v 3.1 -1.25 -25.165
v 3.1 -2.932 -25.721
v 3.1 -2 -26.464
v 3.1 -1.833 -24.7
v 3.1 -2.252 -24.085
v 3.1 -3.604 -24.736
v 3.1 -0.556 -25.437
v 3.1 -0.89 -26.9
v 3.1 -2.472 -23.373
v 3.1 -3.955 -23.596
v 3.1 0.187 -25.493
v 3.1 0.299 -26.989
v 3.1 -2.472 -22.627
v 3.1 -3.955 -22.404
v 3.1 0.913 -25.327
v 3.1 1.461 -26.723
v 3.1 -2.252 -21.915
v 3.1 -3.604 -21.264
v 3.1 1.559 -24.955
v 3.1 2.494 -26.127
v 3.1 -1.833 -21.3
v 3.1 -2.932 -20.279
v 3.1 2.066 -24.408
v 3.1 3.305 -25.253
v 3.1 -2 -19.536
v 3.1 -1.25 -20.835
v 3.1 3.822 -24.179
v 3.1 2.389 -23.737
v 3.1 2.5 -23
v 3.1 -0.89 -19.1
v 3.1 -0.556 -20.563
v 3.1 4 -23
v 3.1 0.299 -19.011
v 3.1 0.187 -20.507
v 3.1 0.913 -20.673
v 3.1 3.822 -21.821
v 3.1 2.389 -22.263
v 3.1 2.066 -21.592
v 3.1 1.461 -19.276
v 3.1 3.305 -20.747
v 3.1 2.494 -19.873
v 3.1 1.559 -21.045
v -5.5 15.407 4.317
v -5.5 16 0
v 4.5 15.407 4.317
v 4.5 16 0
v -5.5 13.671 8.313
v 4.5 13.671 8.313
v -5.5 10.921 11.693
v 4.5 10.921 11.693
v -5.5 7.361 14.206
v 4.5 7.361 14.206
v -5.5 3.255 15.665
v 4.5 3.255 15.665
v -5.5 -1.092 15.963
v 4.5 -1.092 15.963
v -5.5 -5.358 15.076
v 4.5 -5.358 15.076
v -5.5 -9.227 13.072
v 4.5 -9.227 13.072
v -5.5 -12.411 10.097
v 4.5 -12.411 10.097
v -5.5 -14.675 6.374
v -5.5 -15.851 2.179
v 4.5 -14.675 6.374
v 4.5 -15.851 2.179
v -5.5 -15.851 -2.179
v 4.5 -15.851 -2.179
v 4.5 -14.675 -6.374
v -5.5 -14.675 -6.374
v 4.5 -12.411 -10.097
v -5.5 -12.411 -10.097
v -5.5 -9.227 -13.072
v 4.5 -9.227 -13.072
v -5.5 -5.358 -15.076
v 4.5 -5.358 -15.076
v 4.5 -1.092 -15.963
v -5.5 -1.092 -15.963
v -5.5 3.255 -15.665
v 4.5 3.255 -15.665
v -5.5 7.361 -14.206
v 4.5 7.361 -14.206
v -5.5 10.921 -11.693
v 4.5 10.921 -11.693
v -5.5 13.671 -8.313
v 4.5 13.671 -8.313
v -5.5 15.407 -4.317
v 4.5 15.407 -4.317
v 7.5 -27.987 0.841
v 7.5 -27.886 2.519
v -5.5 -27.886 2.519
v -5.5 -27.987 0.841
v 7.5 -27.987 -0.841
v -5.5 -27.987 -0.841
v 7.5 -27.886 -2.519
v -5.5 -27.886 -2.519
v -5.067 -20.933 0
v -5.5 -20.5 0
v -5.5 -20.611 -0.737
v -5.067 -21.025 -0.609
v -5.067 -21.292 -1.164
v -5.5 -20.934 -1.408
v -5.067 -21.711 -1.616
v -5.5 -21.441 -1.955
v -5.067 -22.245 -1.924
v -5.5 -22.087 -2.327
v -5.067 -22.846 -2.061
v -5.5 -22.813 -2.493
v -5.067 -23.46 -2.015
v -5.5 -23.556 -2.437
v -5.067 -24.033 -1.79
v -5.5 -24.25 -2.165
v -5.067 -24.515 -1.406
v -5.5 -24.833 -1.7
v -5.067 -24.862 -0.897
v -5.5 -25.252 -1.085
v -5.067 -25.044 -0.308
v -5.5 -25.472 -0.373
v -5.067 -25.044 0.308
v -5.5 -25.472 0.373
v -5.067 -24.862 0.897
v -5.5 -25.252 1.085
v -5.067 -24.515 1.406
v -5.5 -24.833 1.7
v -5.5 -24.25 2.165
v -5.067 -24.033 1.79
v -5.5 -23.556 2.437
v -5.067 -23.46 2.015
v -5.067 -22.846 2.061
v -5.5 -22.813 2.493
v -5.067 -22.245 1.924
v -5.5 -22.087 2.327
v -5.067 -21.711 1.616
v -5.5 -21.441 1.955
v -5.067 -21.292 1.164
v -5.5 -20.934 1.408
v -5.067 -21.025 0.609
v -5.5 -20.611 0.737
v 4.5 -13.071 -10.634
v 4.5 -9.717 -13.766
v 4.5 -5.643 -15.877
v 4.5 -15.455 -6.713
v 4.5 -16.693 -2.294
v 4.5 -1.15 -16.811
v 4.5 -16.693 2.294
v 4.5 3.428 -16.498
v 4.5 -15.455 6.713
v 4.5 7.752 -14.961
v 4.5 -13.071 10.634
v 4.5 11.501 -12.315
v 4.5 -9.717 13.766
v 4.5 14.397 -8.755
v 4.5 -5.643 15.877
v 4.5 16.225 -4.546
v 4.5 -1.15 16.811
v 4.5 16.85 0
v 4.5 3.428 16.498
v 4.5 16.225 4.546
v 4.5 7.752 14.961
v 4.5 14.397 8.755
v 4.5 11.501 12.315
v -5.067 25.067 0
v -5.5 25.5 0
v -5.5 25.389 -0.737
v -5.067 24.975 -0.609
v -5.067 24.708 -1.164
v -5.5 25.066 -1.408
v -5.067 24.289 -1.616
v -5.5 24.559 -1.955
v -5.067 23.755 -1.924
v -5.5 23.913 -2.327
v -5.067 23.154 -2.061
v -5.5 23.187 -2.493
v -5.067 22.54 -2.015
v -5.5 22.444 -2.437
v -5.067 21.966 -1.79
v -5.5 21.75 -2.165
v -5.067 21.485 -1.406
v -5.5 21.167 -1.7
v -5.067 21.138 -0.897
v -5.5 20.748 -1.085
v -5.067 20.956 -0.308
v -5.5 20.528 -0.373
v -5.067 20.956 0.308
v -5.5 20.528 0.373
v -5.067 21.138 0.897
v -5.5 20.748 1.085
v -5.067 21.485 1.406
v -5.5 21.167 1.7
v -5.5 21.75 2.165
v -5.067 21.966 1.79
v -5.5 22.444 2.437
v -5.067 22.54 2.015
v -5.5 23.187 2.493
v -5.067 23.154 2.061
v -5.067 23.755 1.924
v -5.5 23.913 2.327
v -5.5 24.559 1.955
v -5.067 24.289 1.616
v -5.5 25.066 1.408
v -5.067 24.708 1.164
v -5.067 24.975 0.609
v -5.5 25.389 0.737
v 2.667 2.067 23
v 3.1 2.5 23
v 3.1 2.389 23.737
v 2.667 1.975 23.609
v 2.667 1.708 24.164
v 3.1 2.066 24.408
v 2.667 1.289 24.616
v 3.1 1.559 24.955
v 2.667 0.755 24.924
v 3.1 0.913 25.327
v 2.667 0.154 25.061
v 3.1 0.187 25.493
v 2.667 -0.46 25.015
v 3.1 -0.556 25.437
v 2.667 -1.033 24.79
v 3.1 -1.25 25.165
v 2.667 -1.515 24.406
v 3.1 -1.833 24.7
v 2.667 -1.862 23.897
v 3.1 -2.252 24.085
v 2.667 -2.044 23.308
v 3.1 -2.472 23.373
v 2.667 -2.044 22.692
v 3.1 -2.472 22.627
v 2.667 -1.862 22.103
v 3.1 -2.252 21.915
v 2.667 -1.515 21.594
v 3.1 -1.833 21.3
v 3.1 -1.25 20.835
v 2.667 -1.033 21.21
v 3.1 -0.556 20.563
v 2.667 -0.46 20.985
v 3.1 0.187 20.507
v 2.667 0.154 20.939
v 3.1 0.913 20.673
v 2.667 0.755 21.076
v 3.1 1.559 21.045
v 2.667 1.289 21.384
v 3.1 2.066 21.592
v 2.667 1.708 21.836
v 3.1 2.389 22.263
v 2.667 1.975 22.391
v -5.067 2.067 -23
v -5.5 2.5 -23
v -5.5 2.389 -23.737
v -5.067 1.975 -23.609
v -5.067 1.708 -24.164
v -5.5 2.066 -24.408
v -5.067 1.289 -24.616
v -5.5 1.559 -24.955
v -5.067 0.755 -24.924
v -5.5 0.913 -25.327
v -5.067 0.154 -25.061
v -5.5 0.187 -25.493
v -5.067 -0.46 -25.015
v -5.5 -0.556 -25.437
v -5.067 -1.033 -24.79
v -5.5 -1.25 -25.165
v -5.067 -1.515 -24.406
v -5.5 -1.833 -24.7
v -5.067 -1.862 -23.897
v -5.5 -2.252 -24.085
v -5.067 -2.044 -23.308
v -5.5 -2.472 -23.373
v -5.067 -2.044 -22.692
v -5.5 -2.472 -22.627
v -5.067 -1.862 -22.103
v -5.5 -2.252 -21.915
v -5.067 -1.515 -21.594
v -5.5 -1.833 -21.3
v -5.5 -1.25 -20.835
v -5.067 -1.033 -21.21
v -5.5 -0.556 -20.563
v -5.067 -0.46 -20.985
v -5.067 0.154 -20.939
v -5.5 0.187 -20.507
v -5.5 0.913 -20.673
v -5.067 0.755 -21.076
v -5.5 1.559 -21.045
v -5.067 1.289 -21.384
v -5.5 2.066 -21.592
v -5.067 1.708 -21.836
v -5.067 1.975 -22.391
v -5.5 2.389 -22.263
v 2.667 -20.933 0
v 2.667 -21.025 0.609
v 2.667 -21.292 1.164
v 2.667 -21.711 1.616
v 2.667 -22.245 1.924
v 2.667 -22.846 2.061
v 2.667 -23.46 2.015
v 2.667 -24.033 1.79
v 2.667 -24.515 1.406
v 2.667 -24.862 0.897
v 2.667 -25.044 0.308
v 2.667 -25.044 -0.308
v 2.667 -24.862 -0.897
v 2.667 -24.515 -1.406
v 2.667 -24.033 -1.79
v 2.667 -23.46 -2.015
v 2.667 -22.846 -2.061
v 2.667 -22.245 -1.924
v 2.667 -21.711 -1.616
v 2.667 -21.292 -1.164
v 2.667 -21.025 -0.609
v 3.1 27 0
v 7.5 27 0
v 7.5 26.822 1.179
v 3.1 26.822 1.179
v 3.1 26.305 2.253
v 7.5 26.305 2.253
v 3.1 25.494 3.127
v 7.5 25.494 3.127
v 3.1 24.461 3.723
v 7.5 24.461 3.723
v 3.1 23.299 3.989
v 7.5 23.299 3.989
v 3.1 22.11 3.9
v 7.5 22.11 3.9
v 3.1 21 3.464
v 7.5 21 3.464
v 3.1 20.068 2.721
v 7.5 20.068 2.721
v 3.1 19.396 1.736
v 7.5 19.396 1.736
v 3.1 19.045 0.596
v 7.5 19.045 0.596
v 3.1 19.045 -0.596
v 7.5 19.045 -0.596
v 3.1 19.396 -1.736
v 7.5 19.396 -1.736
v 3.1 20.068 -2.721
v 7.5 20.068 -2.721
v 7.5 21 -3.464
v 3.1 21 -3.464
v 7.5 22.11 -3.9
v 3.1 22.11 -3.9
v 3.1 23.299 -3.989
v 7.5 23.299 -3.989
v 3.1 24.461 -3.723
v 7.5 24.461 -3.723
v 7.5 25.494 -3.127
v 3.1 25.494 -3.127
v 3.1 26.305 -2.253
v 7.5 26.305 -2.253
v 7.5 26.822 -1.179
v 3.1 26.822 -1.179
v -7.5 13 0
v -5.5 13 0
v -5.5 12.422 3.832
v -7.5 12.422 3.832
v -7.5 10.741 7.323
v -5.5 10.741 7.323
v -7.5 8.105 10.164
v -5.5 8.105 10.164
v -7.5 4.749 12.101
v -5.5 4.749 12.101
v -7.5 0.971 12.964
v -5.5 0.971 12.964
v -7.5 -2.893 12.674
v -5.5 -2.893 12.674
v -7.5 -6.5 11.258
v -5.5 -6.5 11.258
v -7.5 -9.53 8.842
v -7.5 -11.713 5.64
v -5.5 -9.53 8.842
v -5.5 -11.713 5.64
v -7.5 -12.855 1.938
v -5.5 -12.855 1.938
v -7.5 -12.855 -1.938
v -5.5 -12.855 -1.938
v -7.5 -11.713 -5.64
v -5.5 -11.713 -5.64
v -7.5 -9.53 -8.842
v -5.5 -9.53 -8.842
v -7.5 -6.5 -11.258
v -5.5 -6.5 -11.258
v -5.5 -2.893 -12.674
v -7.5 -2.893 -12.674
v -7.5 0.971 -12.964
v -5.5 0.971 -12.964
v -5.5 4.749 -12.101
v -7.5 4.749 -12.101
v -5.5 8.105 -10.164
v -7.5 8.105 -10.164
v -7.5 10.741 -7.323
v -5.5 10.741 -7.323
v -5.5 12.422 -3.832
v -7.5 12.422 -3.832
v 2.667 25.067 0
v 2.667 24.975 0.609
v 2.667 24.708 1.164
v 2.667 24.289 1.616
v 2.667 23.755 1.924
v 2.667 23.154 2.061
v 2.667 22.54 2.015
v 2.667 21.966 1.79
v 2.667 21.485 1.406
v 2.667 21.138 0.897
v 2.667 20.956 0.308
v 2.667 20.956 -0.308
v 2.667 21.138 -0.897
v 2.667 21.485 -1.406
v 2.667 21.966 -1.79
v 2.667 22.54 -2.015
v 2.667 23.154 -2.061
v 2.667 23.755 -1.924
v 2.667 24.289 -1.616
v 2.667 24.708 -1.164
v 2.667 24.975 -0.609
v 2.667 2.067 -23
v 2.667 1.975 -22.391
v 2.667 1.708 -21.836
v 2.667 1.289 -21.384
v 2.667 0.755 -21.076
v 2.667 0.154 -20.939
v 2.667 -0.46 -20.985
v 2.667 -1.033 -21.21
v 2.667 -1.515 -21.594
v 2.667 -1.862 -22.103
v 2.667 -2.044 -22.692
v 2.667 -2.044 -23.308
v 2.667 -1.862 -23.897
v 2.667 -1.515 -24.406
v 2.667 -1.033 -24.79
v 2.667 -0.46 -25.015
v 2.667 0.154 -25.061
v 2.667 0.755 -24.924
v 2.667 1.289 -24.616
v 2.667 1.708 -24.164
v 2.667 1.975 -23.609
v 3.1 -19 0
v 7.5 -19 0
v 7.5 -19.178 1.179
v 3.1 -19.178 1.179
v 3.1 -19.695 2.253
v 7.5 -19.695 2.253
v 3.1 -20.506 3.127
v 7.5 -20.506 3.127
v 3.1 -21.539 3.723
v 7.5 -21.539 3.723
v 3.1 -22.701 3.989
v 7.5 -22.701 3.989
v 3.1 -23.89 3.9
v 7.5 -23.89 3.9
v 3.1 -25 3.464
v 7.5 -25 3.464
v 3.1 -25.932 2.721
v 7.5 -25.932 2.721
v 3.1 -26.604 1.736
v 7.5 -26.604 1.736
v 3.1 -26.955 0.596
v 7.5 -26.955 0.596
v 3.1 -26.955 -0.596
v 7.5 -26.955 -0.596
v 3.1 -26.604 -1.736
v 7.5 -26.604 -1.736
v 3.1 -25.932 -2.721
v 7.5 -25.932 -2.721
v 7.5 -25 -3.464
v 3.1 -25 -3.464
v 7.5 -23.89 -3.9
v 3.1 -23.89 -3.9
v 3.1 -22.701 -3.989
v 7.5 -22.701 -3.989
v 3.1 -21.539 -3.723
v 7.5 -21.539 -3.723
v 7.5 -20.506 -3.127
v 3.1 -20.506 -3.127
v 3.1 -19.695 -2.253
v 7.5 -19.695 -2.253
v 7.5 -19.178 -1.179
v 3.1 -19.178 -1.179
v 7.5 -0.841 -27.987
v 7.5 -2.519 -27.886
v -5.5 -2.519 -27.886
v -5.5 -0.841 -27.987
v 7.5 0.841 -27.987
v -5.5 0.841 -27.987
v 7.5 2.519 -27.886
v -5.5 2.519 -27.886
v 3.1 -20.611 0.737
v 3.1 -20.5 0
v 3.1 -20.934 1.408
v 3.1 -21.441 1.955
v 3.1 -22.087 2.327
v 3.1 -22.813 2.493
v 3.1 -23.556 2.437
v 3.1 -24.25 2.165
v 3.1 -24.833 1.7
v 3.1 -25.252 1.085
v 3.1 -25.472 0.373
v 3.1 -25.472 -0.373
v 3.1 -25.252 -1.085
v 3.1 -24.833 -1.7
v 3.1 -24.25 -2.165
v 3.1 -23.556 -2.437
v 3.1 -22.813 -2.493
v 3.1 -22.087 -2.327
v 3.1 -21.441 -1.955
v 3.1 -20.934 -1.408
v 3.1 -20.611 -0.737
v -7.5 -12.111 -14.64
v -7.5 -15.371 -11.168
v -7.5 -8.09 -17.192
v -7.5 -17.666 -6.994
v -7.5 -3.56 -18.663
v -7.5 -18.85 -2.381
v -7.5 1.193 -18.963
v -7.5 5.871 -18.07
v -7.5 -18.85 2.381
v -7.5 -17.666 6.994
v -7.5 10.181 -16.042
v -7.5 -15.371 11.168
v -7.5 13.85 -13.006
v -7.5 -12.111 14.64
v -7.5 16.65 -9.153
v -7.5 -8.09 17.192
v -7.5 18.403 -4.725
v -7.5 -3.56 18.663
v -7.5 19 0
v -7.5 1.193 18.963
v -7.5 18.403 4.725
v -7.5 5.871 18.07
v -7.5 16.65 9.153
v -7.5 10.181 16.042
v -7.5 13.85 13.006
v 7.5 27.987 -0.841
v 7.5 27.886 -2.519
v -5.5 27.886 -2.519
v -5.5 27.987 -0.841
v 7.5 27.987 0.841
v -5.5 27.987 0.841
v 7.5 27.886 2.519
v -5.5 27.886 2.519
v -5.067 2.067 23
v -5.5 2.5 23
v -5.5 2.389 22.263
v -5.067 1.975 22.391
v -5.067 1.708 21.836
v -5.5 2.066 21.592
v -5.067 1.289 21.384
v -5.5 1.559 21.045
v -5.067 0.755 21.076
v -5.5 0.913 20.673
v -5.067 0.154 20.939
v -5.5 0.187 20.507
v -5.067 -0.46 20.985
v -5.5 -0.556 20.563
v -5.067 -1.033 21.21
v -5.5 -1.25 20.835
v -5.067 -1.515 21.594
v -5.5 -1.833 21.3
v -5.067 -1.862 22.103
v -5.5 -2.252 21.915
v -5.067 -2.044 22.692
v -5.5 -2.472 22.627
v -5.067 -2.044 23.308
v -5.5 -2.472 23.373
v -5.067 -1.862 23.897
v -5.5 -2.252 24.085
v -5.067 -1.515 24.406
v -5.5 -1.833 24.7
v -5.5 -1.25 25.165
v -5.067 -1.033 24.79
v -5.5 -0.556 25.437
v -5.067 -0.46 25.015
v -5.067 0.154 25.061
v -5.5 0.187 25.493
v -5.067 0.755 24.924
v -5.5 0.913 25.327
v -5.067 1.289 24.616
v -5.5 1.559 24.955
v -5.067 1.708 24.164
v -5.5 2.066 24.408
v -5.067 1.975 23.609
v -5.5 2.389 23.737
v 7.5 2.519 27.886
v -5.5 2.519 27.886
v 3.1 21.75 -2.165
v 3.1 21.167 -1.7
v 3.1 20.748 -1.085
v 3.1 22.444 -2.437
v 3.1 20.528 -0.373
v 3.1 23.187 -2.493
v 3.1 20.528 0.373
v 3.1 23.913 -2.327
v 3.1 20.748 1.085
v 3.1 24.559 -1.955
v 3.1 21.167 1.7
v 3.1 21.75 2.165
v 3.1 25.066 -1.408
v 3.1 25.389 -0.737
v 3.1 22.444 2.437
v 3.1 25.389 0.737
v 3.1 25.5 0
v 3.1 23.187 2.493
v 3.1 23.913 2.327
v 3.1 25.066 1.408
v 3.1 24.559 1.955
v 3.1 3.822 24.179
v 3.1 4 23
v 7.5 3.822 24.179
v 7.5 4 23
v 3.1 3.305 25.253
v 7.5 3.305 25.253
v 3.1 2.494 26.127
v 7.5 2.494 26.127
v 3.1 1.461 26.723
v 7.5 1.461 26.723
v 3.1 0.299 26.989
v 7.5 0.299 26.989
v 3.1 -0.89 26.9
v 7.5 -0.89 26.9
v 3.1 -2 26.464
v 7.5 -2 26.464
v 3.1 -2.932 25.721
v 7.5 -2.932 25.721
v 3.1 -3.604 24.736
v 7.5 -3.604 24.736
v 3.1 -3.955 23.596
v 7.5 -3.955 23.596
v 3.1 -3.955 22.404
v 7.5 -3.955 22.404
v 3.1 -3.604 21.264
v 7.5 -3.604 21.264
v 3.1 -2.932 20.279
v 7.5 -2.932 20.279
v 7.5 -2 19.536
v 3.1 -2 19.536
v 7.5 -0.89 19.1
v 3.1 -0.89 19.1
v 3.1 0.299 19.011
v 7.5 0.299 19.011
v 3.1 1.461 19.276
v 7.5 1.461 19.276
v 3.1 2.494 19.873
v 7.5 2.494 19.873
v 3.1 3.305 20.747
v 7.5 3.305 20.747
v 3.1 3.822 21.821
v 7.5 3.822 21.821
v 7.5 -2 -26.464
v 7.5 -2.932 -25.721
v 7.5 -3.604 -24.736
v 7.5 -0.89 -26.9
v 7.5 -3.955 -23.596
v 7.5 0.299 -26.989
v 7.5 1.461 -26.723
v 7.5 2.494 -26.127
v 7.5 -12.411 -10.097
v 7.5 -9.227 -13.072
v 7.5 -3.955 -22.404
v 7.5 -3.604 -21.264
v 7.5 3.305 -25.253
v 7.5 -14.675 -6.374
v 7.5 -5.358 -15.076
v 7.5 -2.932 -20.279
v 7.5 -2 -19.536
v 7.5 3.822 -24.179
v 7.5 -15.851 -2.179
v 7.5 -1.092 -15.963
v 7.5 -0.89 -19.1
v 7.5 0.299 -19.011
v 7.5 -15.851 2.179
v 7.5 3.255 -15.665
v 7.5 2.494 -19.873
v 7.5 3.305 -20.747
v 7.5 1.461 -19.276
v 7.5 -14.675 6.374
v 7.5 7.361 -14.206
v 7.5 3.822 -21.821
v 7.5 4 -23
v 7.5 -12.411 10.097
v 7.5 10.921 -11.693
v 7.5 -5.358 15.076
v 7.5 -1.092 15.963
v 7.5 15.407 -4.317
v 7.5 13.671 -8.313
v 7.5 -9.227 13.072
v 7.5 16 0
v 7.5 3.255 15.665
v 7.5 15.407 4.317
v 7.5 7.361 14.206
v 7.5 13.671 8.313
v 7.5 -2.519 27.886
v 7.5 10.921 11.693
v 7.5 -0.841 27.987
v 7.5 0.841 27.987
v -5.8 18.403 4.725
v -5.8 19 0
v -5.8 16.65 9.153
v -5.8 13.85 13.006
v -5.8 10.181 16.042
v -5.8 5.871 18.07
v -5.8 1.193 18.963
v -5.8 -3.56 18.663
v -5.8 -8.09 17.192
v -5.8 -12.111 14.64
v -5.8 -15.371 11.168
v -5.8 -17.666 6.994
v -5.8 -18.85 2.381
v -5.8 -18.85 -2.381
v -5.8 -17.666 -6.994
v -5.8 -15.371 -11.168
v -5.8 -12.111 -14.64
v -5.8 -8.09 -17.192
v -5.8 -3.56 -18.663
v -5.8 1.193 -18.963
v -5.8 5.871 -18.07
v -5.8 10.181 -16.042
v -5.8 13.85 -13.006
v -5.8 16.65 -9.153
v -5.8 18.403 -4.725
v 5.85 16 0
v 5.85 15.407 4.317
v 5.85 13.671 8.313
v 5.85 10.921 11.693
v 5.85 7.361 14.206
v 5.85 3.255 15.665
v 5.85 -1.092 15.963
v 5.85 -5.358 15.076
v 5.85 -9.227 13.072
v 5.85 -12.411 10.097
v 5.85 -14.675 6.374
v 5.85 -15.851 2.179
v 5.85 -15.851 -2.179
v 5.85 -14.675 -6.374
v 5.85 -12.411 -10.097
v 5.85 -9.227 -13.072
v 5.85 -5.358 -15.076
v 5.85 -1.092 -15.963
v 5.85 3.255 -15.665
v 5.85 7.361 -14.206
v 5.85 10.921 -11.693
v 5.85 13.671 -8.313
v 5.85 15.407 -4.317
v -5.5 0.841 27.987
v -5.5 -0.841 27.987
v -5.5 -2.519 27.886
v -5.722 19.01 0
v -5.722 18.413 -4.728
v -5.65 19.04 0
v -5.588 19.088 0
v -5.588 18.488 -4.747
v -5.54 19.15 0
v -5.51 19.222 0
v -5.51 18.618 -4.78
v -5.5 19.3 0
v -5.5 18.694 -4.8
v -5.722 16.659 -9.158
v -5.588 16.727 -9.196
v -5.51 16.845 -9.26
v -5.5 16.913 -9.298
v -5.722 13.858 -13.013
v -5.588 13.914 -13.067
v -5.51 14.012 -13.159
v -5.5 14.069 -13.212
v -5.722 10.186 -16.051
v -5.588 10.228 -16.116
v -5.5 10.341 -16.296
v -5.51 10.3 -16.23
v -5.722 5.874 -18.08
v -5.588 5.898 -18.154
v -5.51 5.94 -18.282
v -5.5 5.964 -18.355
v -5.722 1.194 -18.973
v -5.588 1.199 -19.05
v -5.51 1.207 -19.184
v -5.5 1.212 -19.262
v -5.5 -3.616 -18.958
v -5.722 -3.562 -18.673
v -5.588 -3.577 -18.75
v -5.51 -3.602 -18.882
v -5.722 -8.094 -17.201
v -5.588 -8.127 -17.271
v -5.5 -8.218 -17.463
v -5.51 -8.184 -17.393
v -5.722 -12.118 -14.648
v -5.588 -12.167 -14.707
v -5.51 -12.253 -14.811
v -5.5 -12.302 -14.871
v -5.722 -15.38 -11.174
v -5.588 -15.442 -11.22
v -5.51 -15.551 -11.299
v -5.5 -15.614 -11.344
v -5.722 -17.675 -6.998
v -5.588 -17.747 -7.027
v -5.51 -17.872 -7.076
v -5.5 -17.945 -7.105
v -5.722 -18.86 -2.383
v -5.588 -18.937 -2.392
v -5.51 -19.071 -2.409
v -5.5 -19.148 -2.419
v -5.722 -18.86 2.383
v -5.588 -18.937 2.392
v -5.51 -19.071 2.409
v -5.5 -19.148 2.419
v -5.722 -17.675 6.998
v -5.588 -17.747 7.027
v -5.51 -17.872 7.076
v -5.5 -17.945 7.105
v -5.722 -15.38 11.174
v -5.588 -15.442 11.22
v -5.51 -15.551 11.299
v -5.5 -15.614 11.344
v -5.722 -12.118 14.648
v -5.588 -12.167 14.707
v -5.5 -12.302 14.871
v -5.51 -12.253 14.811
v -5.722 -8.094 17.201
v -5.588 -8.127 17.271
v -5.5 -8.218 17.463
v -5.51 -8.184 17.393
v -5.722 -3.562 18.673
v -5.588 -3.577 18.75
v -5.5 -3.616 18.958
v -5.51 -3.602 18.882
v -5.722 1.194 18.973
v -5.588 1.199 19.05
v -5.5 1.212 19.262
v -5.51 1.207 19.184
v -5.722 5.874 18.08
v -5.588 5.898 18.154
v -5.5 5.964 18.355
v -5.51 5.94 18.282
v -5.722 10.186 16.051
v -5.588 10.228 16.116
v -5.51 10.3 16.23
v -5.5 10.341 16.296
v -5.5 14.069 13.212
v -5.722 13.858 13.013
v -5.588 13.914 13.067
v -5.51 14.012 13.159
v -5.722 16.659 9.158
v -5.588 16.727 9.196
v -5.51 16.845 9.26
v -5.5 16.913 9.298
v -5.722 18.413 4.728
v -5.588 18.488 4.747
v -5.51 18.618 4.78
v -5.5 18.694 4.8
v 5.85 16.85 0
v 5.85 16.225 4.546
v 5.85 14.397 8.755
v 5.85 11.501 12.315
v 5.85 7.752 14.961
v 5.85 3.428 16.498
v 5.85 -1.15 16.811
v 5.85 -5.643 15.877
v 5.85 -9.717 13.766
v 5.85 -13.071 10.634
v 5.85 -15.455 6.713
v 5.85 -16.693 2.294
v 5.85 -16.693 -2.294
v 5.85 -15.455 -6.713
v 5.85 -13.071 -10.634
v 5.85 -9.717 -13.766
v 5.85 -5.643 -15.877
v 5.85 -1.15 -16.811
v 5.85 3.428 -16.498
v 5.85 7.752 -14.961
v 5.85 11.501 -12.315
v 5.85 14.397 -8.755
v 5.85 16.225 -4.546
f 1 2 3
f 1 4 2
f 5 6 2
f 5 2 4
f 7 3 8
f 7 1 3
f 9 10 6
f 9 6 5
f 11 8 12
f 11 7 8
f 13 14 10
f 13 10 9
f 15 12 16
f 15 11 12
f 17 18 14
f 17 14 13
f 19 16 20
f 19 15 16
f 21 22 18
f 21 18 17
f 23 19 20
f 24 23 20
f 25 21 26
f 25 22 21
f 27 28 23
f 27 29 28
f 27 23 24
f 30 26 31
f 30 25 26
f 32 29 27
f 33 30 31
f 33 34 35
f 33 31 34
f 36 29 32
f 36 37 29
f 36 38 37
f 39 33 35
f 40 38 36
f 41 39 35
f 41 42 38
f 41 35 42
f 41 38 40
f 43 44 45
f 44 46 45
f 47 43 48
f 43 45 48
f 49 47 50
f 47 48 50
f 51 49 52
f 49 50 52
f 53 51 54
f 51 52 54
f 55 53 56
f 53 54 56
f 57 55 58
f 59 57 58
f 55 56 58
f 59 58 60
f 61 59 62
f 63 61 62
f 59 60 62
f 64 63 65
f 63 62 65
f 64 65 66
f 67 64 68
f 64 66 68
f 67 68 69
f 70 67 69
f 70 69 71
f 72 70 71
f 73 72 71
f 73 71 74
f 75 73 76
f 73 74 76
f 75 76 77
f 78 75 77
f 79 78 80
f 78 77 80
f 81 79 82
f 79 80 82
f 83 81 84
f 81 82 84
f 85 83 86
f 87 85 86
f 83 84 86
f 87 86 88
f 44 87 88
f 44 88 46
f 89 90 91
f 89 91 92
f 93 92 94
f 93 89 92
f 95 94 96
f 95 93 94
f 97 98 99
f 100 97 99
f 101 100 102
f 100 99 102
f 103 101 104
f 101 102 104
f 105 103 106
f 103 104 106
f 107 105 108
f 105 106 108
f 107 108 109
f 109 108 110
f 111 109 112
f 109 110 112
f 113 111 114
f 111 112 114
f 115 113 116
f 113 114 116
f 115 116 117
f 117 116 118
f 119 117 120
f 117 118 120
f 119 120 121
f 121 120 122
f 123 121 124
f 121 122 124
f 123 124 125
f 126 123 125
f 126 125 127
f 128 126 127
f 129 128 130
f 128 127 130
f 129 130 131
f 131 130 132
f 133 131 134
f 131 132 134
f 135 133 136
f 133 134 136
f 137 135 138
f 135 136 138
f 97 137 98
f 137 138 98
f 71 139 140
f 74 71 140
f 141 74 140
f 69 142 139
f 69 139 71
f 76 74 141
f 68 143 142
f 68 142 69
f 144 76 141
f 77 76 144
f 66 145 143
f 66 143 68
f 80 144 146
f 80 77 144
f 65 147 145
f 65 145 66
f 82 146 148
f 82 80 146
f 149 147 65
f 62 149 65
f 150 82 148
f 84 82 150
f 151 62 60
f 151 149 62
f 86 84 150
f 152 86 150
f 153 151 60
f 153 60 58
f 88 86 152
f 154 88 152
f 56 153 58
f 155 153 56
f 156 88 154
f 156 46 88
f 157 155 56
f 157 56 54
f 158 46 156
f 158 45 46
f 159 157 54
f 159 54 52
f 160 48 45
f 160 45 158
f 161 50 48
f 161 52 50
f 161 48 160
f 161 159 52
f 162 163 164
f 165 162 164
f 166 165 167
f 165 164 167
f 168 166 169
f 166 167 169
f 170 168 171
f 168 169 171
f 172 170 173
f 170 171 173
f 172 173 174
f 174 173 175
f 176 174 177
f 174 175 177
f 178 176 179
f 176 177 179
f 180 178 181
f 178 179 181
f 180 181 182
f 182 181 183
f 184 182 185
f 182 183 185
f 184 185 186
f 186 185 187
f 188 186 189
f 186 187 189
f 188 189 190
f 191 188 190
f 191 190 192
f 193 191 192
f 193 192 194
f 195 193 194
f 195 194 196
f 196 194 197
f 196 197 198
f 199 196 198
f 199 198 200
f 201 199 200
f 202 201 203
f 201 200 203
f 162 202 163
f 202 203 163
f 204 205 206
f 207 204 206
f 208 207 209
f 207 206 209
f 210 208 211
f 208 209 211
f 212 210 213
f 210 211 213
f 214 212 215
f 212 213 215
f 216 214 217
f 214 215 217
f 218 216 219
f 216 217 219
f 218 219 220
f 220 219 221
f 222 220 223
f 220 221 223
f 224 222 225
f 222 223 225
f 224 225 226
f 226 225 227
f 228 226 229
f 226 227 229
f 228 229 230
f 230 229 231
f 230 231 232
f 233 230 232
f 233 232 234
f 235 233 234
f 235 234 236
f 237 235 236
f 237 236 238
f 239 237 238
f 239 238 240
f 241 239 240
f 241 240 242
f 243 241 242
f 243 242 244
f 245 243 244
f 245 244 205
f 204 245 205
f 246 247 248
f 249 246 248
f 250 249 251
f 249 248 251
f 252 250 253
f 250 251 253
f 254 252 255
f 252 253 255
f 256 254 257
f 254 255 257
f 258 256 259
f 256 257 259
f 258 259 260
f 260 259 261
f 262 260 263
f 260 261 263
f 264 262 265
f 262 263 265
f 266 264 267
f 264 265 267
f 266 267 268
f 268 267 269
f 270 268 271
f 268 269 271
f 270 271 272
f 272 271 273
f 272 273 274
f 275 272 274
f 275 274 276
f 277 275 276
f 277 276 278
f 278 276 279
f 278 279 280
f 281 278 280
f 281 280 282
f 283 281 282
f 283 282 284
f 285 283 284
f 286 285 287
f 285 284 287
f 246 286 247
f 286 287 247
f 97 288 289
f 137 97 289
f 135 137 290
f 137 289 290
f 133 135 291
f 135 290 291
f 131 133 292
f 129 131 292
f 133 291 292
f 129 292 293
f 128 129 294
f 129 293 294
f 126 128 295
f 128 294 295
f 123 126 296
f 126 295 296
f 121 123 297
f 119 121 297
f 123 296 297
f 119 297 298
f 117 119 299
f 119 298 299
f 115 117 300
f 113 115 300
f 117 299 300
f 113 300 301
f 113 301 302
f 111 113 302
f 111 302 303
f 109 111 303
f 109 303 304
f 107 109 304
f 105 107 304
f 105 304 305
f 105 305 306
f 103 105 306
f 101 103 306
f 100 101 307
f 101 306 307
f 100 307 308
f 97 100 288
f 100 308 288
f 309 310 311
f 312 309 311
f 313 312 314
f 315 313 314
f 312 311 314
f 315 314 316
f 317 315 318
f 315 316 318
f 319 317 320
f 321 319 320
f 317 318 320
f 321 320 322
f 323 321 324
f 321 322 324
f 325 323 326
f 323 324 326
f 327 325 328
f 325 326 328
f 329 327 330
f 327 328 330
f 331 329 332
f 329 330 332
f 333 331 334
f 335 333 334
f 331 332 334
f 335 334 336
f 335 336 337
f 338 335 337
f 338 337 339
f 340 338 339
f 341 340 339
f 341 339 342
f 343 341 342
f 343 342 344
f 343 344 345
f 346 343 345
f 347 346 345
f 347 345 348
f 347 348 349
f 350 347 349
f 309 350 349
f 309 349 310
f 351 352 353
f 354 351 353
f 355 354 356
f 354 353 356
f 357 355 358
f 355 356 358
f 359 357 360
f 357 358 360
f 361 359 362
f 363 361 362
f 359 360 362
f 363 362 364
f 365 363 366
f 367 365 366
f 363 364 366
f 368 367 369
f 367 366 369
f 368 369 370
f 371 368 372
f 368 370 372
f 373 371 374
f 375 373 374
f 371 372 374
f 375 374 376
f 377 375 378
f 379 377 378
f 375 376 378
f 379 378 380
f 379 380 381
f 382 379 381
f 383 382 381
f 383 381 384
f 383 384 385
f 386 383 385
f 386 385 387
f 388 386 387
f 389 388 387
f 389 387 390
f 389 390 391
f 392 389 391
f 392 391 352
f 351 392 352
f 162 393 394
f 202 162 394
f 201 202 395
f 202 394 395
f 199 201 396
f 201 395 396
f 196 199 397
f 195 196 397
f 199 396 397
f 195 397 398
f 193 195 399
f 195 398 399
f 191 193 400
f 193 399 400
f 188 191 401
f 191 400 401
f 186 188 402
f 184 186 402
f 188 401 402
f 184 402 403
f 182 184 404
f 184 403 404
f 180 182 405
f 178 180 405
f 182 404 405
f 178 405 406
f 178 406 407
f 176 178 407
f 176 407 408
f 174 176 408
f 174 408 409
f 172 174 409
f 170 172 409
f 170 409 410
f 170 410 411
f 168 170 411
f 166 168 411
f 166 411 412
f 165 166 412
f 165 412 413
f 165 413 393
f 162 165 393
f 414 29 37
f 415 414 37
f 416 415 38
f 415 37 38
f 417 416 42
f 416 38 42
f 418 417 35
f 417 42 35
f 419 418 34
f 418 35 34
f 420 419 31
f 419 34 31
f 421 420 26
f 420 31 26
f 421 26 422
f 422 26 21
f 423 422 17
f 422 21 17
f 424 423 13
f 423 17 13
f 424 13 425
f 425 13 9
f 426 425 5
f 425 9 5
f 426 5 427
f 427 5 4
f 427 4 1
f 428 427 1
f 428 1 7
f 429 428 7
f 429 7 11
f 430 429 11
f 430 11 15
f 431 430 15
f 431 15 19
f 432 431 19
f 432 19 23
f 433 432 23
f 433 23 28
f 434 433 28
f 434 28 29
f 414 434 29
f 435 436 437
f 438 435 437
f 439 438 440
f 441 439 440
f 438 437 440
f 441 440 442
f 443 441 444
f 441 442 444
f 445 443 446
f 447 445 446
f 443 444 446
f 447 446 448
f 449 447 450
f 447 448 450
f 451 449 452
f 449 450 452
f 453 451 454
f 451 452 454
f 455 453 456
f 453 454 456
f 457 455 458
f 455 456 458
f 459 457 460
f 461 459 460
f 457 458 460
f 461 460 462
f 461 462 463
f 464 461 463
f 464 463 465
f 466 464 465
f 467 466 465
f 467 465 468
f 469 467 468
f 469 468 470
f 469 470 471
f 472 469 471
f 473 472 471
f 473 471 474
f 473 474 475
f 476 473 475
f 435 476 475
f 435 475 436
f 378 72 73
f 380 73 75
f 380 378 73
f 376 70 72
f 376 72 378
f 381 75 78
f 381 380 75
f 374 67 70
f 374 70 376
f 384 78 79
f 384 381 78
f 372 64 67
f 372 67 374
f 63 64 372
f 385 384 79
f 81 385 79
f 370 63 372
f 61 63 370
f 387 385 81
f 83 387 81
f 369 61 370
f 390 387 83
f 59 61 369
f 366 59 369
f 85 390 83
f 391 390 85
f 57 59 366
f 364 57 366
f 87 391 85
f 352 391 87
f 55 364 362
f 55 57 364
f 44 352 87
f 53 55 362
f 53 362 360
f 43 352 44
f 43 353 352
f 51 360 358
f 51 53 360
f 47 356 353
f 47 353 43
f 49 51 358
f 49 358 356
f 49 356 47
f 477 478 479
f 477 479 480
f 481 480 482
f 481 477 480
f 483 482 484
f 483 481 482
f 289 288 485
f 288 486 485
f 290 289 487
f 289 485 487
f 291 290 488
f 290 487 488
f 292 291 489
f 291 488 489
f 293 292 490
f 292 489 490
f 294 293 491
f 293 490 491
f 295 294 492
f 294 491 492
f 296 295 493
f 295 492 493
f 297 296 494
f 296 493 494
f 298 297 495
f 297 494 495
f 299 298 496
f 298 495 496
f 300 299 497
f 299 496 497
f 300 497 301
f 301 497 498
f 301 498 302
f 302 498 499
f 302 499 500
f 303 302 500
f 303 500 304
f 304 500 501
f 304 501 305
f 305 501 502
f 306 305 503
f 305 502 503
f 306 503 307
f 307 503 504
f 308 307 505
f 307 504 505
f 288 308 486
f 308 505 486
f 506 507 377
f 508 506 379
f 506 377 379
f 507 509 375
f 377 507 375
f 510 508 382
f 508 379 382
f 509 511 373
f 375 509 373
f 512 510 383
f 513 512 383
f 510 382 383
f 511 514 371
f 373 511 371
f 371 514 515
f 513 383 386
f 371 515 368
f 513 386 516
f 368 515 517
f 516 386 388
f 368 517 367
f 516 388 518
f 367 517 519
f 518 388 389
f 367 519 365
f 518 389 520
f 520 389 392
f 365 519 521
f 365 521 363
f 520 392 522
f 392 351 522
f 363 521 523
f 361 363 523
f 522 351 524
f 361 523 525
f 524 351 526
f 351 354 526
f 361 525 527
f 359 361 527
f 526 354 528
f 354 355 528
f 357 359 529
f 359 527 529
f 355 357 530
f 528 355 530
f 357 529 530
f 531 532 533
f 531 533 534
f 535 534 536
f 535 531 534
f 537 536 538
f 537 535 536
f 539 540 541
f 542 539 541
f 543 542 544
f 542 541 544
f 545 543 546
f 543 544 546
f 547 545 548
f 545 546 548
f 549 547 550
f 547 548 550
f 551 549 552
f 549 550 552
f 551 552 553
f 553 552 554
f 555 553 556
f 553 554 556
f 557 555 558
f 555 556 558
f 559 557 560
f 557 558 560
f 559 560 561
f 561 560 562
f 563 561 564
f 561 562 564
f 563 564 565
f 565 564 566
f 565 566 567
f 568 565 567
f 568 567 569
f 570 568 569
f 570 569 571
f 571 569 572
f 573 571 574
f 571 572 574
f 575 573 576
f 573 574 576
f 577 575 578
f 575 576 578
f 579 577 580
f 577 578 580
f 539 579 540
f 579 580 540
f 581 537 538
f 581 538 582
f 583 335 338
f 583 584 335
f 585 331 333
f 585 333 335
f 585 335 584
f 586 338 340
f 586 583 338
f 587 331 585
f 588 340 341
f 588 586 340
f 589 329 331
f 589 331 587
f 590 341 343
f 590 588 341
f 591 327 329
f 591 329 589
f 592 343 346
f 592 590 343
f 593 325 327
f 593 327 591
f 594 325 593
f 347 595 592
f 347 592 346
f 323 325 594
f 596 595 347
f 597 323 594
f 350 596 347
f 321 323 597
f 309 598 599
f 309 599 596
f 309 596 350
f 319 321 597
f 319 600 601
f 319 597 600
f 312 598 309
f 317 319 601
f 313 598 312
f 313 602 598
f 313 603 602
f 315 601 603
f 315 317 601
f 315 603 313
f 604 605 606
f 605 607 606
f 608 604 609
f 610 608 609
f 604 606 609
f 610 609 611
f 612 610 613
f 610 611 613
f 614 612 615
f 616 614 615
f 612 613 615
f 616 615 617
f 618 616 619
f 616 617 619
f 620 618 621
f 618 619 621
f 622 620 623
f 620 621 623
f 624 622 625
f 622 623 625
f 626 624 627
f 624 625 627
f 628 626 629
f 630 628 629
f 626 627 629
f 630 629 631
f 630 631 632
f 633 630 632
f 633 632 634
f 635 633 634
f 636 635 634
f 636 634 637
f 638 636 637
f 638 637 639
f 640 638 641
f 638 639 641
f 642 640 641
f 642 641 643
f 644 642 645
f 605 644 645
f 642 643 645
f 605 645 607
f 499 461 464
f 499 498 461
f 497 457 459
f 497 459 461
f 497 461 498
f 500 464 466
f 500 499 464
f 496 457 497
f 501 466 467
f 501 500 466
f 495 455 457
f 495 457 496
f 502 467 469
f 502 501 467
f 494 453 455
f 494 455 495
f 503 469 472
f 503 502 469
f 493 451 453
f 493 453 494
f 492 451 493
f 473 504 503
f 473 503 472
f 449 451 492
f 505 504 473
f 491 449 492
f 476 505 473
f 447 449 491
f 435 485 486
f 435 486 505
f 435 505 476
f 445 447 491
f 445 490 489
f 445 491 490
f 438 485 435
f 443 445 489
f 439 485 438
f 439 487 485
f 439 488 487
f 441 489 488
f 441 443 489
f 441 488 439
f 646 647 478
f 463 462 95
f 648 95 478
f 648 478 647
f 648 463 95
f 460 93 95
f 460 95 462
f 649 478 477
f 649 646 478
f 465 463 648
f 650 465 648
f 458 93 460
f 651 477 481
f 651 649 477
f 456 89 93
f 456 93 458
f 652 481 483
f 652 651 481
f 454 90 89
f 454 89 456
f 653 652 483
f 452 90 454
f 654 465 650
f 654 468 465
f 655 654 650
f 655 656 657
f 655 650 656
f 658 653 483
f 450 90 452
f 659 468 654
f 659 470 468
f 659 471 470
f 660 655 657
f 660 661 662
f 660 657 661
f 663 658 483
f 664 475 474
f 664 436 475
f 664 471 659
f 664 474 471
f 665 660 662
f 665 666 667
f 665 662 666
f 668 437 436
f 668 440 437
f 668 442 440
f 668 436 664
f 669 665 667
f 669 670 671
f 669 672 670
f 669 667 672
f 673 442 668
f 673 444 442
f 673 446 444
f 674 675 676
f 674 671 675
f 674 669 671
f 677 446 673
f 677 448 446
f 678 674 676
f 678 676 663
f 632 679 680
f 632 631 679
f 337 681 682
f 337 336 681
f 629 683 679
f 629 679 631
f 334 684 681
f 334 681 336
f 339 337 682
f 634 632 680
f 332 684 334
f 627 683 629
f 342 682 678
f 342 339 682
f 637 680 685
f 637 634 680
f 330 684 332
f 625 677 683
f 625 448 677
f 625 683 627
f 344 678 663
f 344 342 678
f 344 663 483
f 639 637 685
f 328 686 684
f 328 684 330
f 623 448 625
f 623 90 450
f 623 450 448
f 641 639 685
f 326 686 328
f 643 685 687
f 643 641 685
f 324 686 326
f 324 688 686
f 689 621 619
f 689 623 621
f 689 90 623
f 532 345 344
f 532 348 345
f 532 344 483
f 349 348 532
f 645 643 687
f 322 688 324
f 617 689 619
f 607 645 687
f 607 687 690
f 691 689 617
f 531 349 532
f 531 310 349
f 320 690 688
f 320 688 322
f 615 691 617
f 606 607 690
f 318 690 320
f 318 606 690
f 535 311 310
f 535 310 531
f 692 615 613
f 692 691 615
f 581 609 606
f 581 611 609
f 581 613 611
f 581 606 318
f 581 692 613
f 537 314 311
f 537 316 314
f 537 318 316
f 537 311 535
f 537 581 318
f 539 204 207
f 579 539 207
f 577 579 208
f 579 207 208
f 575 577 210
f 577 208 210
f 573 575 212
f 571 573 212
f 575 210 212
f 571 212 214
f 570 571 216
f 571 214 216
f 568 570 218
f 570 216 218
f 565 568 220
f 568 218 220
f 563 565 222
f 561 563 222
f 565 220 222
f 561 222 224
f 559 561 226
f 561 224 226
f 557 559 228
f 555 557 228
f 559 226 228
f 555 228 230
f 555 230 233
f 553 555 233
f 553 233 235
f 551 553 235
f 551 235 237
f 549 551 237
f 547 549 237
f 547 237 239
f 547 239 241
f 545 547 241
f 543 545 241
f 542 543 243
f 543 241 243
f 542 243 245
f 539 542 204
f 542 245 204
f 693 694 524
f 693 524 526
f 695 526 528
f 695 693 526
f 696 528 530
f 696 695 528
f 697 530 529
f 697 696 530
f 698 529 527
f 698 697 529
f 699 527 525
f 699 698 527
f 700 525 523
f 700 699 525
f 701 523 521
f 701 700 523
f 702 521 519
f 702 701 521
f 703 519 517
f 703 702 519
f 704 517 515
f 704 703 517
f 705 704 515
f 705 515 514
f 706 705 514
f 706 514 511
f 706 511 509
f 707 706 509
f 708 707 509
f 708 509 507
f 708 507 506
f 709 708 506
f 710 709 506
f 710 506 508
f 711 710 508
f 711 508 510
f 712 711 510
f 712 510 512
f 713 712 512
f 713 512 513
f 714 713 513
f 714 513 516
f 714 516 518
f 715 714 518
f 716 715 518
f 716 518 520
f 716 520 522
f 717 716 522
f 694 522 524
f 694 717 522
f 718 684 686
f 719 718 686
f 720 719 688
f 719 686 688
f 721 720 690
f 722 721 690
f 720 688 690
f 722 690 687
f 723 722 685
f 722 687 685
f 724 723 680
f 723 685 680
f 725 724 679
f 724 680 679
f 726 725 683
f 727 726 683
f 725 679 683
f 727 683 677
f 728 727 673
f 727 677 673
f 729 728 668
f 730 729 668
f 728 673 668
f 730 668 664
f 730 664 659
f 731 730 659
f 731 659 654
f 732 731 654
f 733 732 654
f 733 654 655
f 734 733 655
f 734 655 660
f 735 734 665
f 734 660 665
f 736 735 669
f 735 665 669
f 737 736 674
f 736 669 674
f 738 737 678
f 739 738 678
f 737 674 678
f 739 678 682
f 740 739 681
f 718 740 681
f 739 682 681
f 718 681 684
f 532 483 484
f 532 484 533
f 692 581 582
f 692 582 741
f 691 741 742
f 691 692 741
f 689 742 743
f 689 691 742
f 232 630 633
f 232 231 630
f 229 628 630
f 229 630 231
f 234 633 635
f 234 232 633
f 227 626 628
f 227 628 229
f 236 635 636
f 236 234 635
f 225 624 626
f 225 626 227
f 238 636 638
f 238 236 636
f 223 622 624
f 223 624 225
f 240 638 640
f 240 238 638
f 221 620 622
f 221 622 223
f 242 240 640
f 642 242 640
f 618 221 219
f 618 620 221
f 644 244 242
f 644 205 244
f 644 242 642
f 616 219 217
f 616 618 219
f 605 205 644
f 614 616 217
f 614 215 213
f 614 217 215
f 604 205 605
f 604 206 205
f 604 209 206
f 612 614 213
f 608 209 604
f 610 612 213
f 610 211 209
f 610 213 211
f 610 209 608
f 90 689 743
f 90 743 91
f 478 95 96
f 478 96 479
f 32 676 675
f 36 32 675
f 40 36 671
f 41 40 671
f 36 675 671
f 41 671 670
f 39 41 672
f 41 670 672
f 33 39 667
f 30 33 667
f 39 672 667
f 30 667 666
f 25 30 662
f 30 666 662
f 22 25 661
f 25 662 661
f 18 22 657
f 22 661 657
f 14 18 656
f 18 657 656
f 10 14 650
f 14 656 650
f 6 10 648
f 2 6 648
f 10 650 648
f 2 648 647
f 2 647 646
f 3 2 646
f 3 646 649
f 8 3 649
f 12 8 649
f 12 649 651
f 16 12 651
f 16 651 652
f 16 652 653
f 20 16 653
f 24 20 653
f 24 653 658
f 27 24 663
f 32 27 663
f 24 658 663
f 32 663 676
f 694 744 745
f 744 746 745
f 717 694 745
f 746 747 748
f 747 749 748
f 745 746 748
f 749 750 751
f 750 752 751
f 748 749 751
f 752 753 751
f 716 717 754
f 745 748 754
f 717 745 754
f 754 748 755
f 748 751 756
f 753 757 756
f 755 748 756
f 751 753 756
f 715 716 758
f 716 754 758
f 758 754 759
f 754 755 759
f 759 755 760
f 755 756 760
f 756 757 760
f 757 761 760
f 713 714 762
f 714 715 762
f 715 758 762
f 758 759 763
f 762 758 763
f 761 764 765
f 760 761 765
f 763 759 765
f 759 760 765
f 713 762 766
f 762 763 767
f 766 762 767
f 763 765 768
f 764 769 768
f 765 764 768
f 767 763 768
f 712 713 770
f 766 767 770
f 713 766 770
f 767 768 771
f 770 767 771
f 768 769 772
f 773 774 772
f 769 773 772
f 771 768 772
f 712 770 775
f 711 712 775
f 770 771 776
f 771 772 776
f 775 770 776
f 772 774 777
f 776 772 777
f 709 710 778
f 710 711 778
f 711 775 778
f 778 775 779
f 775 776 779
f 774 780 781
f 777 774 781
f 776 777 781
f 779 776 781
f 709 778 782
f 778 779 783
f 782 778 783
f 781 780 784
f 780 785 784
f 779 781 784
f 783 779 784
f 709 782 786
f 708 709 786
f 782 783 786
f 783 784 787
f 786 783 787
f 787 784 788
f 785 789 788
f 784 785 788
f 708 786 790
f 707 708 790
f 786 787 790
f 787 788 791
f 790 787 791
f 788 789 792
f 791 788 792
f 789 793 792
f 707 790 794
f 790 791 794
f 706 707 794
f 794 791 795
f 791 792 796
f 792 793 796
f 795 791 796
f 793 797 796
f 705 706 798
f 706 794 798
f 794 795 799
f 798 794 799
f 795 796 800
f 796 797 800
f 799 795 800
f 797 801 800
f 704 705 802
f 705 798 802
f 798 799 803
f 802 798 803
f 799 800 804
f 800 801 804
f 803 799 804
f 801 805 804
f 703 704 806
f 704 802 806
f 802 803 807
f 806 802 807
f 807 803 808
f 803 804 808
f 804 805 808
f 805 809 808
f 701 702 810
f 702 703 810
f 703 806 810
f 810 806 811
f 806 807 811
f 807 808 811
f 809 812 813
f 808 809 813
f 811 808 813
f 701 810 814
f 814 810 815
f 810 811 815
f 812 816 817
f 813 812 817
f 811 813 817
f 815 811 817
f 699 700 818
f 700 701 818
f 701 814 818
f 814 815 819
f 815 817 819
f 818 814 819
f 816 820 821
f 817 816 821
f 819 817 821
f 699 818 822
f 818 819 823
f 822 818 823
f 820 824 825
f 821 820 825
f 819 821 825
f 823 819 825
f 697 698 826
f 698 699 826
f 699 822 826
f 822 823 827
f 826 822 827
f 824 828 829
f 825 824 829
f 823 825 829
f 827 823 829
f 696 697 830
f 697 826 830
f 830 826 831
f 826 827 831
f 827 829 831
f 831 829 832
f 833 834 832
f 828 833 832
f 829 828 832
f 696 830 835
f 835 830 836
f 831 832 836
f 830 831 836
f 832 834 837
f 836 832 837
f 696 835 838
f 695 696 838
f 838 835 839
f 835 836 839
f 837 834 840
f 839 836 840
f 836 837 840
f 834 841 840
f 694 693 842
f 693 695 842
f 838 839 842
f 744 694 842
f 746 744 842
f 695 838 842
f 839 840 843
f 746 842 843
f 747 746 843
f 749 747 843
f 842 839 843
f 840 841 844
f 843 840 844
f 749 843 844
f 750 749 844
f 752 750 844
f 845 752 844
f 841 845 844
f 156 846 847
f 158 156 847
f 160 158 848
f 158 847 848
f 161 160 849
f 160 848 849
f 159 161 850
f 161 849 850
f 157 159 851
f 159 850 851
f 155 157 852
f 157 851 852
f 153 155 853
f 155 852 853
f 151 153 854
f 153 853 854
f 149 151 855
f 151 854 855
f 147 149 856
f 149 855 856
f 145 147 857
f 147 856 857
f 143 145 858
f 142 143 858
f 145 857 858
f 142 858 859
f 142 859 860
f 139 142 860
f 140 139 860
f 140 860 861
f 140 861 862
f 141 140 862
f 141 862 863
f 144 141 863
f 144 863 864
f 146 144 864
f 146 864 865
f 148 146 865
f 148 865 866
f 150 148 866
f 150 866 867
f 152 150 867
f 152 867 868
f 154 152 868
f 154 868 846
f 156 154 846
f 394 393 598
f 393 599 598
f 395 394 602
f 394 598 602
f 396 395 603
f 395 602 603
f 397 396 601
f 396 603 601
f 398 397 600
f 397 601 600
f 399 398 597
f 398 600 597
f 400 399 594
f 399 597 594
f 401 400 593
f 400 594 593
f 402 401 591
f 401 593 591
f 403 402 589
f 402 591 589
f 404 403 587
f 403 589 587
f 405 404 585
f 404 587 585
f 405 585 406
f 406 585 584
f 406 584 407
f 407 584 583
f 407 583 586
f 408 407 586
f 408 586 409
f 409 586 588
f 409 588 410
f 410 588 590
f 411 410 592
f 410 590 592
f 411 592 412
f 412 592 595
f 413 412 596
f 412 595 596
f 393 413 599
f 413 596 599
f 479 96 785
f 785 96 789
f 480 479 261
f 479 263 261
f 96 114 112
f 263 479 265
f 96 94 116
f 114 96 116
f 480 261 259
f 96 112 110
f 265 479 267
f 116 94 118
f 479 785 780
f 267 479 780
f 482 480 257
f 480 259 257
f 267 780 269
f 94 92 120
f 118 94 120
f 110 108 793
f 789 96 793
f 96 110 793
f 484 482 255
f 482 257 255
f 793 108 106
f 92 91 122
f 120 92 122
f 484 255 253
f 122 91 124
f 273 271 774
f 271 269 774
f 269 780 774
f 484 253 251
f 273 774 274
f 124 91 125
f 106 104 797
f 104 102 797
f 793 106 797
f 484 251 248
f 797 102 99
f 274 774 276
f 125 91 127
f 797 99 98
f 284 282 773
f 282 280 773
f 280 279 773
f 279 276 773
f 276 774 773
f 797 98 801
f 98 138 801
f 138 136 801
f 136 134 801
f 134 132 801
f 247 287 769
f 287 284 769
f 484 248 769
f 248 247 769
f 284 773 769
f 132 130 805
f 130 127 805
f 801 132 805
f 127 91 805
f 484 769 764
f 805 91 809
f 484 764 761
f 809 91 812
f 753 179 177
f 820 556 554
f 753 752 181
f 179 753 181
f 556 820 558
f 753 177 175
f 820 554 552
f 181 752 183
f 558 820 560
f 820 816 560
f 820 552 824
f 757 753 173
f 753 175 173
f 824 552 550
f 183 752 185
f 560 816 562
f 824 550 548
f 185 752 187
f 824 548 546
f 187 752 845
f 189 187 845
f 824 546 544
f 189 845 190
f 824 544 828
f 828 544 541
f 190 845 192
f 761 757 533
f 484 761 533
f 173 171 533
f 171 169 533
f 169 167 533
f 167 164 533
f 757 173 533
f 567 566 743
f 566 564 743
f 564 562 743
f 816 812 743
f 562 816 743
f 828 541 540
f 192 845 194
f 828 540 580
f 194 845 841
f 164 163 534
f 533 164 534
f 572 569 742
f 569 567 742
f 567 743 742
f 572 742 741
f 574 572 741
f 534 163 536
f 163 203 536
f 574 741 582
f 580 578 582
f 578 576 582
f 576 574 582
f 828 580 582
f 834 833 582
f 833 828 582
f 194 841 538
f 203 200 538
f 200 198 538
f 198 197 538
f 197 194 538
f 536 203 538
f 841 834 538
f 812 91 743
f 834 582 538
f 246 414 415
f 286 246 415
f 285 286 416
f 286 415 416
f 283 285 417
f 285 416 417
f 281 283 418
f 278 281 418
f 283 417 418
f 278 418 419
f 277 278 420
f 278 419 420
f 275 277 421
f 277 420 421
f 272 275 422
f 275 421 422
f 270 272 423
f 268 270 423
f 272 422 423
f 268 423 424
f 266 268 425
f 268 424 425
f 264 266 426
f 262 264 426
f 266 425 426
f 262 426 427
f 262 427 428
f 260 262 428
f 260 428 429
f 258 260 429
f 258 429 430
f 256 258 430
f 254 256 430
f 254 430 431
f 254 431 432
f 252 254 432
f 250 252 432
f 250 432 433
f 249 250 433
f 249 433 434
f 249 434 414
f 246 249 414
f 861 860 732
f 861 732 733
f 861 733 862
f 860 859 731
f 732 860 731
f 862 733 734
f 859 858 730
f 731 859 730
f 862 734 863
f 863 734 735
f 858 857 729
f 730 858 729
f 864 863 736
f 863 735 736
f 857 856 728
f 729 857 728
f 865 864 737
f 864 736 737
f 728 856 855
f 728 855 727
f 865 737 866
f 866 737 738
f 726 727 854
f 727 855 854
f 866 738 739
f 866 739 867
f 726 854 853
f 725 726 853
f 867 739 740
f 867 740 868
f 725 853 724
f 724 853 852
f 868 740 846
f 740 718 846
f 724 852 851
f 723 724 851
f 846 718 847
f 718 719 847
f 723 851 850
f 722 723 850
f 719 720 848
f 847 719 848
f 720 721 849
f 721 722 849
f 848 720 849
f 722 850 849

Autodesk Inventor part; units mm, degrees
sketch "Sketch_7" plane through (0, 0, 0) normal (0, 0, 1) x (1, 0, 0)
  line L0 (7.5, 0) -> (-7.5, 0)
  line L1 (-7.5, 0) -> (-7.5, 19)
  line L2 (-7.5, 19) -> (-5.8, 19)
  arc A0 (-5.8, 19) -> (-5.5, 19.3) centre (-5.8, 19.3) ccw
  line L3 (-5.5, 19.3) -> (-5.5, 28)
  line L4 (-5.5, 28) -> (7.5, 28)
  line L5 (7.5, 28) -> (7.5, 0)
  line L6 (7.5, 0) -> (-7.5, 0)
revolve "Revolution1" add sketch "Sketch_7" angle 360 about axis through (7.5, 0, 0) along (1, 0, 0)
sketch "Sketch_1" plane through (0, 0, 0) normal (0, 0, 1) x (1, 0, 0)
  line L0 (7.5, 0) -> (-7.5, 0)
  line L1 (-7.5, 0) -> (-7.5, 13)
  line L2 (-7.5, 13) -> (-5.5, 13)
  line L3 (-5.5, 13) -> (-5.5, 16)
  line L4 (-5.5, 16) -> (4.5, 16)
  line L5 (4.5, 16) -> (4.5, 16.85)
  line L6 (4.5, 16.85) -> (5.85, 16.85)
  line L7 (5.85, 16.85) -> (5.85, 16)
  line L8 (5.85, 16) -> (7.5, 16)
  line L9 (7.5, 16) -> (7.5, 0)
  line L10 (7.5, 0) -> (-7.5, 0)
revolve "Revolution2" cut sketch "Sketch_1" angle 360 about axis through (7.5, 0, 0) along (1, 0, 0)
sketch "Sketch_2" plane through (0, 0, 0) normal (0, 0, 1) x (1, 0, 0)
  line L0 (7.5, 23) -> (-5.5, 23)
  line L1 (-5.5, 23) -> (-5.5, 25.5)
  line L2 (-5.5, 25.5) -> (-5.067, 25.067)
  line L3 (-5.067, 25.067) -> (2.667, 25.067)
  line L4 (2.667, 25.067) -> (3.1, 25.5)
  line L5 (3.1, 25.5) -> (3.1, 27)
  line L6 (3.1, 27) -> (7.5, 27)
  line L7 (7.5, 27) -> (7.5, 23)
  line L8 (7.5, 23) -> (-5.5, 23)
revolve "Revolution3" cut sketch "Sketch_2" angle 360 about axis through (7.5, 23, 0) along (1, 0, 0)
thread "Thread1" size "M5x0.8" class "6H" standard "ISO Metric profile" full length
sketch "Sketch_4" plane through (7.5, 0, 0) normal (1, 0, 0) x (0, 0, -1)
  circle A0 centre (0, 0) radius 118.9529
  line L0 (-30.4056, 0) -> (0, -30.4056)
  line L1 (0, -30.4056) -> (30.4056, 0)
  line L2 (30.4056, 0) -> (0, 30.4056)
  line L3 (0, 30.4056) -> (-30.4056, 0)
extrude "Extrusion1" cut sketch "Sketch_4" against normal blind 15
pattern_linear "Rectangular Pattern1" count 2 spacing 32.5269 along (0, -0.7071, 0.7071) count 2 spacing 32.5269 along (0, -0.7071, -0.7071) of "Revolution3"
ref_plane "housing_to_dummy_XY" through (-7.5, 0, 0) normal (0, 0, 1) x (1, 0, 0)
ref_plane "housing_to_dummy_YZ" through (-7.5, 0, 0) normal (1, 0, 0) x (0, 1, 0)
ref_plane "housing_to_dummy_ZX" through (-7.5, 0, 0) normal (0, 1, 0) x (0, 0, 1)
ref_plane "to_bearings_XY" through (-5.5, 0, 0) normal (-1, 0, 0) x (0, 0, -1)
ref_plane "to_bearings_YZ" through (-5.5, 0, 0) normal (0, 0, -1) x (0, -1, 0)
ref_plane "to_bearings_ZX" through (-5.5, 0, 0) normal (0, -1, 0) x (-1, 0, 0)
ref_plane "to_rring_XY" through (4.5, 0, 0) normal (-1, 0, 0) x (0, 0, -1)
ref_plane "to_rring_YZ" through (4.5, 0, 0) normal (0, 0, -1) x (0, -1, 0)
ref_plane "to_rring_ZX" through (4.5, 0, 0) normal (0, -1, 0) x (-1, 0, 0)
properties part number "BGSRB6201ZZ_h"
